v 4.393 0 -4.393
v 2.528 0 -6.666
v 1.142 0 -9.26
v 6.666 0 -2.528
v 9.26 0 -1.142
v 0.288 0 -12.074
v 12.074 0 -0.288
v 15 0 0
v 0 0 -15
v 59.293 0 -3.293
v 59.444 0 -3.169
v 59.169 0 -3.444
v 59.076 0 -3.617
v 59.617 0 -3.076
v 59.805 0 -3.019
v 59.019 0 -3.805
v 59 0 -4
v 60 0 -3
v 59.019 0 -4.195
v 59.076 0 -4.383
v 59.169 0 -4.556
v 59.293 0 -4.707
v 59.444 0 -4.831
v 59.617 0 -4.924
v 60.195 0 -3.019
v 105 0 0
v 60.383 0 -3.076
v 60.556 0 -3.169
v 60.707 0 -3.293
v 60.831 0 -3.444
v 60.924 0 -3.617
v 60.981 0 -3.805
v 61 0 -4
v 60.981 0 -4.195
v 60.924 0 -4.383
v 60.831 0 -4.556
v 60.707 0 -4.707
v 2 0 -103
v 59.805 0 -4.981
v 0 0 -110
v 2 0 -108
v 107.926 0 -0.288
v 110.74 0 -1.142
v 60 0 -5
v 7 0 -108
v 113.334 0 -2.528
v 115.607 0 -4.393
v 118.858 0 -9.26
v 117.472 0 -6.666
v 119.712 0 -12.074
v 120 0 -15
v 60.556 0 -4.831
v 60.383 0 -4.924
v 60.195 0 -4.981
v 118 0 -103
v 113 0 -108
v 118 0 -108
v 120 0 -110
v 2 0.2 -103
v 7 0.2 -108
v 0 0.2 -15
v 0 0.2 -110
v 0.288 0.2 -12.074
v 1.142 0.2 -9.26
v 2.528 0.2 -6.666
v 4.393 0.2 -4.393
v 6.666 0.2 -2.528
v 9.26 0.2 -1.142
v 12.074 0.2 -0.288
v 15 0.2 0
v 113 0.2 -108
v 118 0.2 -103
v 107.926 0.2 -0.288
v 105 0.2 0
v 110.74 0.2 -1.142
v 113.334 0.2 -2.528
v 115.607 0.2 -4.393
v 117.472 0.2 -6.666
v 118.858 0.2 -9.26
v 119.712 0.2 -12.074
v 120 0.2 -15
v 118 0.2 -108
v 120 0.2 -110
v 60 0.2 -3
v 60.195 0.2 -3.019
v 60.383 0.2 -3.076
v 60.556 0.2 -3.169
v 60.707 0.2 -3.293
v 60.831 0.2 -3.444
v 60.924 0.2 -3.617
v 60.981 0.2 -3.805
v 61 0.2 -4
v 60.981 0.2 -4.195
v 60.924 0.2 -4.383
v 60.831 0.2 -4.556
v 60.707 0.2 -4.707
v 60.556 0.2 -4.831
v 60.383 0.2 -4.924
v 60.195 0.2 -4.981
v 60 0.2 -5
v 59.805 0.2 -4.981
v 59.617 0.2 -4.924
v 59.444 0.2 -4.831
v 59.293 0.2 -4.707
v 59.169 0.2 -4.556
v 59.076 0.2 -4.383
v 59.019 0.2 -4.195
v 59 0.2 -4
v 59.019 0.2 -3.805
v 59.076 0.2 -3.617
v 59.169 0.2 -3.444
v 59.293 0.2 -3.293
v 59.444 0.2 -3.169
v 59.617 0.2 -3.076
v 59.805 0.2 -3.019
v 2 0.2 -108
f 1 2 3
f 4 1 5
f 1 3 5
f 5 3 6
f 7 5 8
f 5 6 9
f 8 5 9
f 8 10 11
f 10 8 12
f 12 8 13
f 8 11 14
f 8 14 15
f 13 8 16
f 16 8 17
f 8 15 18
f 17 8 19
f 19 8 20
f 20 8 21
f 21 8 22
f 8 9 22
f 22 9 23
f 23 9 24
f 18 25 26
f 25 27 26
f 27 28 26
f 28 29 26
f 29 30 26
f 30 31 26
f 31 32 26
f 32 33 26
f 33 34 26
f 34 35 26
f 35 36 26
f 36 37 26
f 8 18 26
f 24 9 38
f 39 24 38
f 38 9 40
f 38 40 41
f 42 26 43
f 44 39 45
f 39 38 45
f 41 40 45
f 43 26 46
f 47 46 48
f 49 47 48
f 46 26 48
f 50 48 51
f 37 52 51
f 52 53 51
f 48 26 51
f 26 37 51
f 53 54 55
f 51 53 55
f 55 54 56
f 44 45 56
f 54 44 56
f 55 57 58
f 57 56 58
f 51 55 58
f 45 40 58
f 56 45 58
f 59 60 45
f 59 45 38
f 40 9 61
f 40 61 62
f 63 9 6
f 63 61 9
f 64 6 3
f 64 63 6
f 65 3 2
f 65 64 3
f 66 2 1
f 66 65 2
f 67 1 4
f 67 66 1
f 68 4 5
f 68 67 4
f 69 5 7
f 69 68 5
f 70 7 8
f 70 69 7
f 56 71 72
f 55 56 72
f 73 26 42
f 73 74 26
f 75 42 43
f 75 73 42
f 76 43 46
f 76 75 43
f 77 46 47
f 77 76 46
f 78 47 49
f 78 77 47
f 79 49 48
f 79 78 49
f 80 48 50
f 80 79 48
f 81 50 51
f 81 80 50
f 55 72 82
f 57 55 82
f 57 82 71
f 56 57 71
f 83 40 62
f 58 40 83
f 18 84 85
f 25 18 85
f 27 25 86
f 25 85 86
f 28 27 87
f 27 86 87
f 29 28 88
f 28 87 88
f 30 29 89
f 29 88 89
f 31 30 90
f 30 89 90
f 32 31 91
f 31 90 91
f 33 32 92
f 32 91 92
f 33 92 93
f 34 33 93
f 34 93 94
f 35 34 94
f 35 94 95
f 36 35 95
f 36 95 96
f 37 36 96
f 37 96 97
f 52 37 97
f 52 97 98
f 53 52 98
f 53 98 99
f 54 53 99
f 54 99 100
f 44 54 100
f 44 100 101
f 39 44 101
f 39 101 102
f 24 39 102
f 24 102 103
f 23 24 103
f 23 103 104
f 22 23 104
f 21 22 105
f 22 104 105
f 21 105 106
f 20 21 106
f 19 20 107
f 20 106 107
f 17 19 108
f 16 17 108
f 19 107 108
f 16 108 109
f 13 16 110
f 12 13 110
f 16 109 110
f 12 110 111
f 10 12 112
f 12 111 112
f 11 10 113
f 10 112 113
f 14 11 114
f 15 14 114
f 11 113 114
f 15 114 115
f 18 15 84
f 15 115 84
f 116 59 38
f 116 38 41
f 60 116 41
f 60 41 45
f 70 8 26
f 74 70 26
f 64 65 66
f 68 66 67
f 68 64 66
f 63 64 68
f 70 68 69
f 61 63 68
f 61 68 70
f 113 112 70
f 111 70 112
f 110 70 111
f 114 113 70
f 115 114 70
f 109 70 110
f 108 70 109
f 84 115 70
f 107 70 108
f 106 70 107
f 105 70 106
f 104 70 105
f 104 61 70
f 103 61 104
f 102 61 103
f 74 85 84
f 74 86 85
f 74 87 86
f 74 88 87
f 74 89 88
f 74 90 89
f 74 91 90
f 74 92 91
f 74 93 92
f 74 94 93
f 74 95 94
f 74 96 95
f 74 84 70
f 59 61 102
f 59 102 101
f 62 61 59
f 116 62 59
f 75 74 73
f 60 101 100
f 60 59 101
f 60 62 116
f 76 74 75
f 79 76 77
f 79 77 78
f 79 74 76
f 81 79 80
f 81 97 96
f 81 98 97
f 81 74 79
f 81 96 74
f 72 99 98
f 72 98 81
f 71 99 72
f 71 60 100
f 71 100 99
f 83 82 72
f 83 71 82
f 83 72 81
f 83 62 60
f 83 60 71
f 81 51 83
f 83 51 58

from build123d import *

# Parameters (mm, degrees)
SKETCH1_W           = 120
SKETCH1_H           = 110
BOSS_EXTRUDE1_DEPTH = 0.2
FILLET1_R           = 15
SKETCH2_R           = 1
CUT_EXTRUDE1_DEPTH  = 5


with BuildPart() as part:
    # Sketch1 → Boss-Extrude1 (new body)
    with BuildSketch(Plane(origin=(0, 0, 0), x_dir=(1, 0, 0), z_dir=(0, 1, 0))):
        with Locations((60, 55)):
            Rectangle(SKETCH1_W, SKETCH1_H)
    extrude(amount=BOSS_EXTRUDE1_DEPTH)

    # Fillet1
    fillet1_edges = [part.edges().sort_by_distance(p)[0] for p in [
        (120, 0.1, 0),
        (0, 0.1, 0),
    ]]
    fillet(fillet1_edges, radius=FILLET1_R)

    # Sketch2 → Cut-Extrude1 (cut)
    with BuildSketch(Plane(origin=(0, 0.2, 0), x_dir=(1, 0, 0), z_dir=(0, 1, 0))):
        with Locations(Location((60, 4, 0), (0, 0, 270))):
            Circle(SKETCH2_R)
        Polygon((2, 108), (7, 108), (2, 103), align=None)
        Polygon((118, 103), (118, 108), (113, 108), align=None)
    extrude(amount=-CUT_EXTRUDE1_DEPTH, mode=Mode.SUBTRACT)


solid = part.part
